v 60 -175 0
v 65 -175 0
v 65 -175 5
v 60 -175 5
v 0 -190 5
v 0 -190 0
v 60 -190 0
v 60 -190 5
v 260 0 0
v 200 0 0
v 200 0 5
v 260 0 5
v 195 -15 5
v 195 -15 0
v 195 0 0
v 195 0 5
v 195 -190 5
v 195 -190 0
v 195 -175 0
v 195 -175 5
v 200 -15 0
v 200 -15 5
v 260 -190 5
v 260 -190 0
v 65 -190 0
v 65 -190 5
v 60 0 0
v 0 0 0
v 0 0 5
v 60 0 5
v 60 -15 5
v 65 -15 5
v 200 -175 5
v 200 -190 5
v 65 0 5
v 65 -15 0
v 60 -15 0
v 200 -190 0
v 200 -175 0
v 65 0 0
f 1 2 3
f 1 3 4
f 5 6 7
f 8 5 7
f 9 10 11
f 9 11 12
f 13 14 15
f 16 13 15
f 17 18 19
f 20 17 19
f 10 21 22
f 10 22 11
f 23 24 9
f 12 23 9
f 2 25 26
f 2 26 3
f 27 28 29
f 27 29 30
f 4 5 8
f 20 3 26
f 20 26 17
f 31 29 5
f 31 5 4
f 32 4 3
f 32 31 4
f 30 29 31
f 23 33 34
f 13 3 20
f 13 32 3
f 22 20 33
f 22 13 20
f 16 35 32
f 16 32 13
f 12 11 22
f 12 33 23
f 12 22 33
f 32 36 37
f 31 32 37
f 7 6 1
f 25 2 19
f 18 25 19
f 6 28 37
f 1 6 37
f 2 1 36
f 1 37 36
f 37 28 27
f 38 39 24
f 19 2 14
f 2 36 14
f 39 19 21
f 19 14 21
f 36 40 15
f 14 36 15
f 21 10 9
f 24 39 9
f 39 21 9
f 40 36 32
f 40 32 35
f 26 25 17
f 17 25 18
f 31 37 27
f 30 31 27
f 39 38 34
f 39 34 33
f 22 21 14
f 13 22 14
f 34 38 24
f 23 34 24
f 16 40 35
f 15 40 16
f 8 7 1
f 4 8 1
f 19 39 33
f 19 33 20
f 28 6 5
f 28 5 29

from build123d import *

# Parameters (mm, degrees)
SKETCH1_W           = 260
SKETCH1_H           = 190
BOSS_EXTRUDE1_DEPTH = 5
SKETCH2_W           = 5
SKETCH2_H           = 15
CUT_EXTRUDE1_DEPTH  = 5


with BuildPart() as part:
    # Sketch1 → Boss-Extrude1 (new body)
    with BuildSketch(Plane.XY):
        with Locations((130, -95)):
            Rectangle(SKETCH1_W, SKETCH1_H)
    extrude(amount=BOSS_EXTRUDE1_DEPTH)

    # Sketch2 → Cut-Extrude1 (cut)
    with BuildSketch(Plane(origin=(0, 0, 0), x_dir=(-1, 0, 0), z_dir=(0, 0, -1))):
        with Locations((-197.5, -7.5)):
            Rectangle(SKETCH2_W, SKETCH2_H)
        with Locations((-197.5, -182.5)):
            Rectangle(SKETCH2_W, SKETCH2_H)
        with Locations((-62.5, -7.5)):
            Rectangle(SKETCH2_W, SKETCH2_H)
        with Locations((-62.5, -182.5)):
            Rectangle(SKETCH2_W, SKETCH2_H)
    extrude(amount=-CUT_EXTRUDE1_DEPTH, mode=Mode.SUBTRACT)


solid = part.part
